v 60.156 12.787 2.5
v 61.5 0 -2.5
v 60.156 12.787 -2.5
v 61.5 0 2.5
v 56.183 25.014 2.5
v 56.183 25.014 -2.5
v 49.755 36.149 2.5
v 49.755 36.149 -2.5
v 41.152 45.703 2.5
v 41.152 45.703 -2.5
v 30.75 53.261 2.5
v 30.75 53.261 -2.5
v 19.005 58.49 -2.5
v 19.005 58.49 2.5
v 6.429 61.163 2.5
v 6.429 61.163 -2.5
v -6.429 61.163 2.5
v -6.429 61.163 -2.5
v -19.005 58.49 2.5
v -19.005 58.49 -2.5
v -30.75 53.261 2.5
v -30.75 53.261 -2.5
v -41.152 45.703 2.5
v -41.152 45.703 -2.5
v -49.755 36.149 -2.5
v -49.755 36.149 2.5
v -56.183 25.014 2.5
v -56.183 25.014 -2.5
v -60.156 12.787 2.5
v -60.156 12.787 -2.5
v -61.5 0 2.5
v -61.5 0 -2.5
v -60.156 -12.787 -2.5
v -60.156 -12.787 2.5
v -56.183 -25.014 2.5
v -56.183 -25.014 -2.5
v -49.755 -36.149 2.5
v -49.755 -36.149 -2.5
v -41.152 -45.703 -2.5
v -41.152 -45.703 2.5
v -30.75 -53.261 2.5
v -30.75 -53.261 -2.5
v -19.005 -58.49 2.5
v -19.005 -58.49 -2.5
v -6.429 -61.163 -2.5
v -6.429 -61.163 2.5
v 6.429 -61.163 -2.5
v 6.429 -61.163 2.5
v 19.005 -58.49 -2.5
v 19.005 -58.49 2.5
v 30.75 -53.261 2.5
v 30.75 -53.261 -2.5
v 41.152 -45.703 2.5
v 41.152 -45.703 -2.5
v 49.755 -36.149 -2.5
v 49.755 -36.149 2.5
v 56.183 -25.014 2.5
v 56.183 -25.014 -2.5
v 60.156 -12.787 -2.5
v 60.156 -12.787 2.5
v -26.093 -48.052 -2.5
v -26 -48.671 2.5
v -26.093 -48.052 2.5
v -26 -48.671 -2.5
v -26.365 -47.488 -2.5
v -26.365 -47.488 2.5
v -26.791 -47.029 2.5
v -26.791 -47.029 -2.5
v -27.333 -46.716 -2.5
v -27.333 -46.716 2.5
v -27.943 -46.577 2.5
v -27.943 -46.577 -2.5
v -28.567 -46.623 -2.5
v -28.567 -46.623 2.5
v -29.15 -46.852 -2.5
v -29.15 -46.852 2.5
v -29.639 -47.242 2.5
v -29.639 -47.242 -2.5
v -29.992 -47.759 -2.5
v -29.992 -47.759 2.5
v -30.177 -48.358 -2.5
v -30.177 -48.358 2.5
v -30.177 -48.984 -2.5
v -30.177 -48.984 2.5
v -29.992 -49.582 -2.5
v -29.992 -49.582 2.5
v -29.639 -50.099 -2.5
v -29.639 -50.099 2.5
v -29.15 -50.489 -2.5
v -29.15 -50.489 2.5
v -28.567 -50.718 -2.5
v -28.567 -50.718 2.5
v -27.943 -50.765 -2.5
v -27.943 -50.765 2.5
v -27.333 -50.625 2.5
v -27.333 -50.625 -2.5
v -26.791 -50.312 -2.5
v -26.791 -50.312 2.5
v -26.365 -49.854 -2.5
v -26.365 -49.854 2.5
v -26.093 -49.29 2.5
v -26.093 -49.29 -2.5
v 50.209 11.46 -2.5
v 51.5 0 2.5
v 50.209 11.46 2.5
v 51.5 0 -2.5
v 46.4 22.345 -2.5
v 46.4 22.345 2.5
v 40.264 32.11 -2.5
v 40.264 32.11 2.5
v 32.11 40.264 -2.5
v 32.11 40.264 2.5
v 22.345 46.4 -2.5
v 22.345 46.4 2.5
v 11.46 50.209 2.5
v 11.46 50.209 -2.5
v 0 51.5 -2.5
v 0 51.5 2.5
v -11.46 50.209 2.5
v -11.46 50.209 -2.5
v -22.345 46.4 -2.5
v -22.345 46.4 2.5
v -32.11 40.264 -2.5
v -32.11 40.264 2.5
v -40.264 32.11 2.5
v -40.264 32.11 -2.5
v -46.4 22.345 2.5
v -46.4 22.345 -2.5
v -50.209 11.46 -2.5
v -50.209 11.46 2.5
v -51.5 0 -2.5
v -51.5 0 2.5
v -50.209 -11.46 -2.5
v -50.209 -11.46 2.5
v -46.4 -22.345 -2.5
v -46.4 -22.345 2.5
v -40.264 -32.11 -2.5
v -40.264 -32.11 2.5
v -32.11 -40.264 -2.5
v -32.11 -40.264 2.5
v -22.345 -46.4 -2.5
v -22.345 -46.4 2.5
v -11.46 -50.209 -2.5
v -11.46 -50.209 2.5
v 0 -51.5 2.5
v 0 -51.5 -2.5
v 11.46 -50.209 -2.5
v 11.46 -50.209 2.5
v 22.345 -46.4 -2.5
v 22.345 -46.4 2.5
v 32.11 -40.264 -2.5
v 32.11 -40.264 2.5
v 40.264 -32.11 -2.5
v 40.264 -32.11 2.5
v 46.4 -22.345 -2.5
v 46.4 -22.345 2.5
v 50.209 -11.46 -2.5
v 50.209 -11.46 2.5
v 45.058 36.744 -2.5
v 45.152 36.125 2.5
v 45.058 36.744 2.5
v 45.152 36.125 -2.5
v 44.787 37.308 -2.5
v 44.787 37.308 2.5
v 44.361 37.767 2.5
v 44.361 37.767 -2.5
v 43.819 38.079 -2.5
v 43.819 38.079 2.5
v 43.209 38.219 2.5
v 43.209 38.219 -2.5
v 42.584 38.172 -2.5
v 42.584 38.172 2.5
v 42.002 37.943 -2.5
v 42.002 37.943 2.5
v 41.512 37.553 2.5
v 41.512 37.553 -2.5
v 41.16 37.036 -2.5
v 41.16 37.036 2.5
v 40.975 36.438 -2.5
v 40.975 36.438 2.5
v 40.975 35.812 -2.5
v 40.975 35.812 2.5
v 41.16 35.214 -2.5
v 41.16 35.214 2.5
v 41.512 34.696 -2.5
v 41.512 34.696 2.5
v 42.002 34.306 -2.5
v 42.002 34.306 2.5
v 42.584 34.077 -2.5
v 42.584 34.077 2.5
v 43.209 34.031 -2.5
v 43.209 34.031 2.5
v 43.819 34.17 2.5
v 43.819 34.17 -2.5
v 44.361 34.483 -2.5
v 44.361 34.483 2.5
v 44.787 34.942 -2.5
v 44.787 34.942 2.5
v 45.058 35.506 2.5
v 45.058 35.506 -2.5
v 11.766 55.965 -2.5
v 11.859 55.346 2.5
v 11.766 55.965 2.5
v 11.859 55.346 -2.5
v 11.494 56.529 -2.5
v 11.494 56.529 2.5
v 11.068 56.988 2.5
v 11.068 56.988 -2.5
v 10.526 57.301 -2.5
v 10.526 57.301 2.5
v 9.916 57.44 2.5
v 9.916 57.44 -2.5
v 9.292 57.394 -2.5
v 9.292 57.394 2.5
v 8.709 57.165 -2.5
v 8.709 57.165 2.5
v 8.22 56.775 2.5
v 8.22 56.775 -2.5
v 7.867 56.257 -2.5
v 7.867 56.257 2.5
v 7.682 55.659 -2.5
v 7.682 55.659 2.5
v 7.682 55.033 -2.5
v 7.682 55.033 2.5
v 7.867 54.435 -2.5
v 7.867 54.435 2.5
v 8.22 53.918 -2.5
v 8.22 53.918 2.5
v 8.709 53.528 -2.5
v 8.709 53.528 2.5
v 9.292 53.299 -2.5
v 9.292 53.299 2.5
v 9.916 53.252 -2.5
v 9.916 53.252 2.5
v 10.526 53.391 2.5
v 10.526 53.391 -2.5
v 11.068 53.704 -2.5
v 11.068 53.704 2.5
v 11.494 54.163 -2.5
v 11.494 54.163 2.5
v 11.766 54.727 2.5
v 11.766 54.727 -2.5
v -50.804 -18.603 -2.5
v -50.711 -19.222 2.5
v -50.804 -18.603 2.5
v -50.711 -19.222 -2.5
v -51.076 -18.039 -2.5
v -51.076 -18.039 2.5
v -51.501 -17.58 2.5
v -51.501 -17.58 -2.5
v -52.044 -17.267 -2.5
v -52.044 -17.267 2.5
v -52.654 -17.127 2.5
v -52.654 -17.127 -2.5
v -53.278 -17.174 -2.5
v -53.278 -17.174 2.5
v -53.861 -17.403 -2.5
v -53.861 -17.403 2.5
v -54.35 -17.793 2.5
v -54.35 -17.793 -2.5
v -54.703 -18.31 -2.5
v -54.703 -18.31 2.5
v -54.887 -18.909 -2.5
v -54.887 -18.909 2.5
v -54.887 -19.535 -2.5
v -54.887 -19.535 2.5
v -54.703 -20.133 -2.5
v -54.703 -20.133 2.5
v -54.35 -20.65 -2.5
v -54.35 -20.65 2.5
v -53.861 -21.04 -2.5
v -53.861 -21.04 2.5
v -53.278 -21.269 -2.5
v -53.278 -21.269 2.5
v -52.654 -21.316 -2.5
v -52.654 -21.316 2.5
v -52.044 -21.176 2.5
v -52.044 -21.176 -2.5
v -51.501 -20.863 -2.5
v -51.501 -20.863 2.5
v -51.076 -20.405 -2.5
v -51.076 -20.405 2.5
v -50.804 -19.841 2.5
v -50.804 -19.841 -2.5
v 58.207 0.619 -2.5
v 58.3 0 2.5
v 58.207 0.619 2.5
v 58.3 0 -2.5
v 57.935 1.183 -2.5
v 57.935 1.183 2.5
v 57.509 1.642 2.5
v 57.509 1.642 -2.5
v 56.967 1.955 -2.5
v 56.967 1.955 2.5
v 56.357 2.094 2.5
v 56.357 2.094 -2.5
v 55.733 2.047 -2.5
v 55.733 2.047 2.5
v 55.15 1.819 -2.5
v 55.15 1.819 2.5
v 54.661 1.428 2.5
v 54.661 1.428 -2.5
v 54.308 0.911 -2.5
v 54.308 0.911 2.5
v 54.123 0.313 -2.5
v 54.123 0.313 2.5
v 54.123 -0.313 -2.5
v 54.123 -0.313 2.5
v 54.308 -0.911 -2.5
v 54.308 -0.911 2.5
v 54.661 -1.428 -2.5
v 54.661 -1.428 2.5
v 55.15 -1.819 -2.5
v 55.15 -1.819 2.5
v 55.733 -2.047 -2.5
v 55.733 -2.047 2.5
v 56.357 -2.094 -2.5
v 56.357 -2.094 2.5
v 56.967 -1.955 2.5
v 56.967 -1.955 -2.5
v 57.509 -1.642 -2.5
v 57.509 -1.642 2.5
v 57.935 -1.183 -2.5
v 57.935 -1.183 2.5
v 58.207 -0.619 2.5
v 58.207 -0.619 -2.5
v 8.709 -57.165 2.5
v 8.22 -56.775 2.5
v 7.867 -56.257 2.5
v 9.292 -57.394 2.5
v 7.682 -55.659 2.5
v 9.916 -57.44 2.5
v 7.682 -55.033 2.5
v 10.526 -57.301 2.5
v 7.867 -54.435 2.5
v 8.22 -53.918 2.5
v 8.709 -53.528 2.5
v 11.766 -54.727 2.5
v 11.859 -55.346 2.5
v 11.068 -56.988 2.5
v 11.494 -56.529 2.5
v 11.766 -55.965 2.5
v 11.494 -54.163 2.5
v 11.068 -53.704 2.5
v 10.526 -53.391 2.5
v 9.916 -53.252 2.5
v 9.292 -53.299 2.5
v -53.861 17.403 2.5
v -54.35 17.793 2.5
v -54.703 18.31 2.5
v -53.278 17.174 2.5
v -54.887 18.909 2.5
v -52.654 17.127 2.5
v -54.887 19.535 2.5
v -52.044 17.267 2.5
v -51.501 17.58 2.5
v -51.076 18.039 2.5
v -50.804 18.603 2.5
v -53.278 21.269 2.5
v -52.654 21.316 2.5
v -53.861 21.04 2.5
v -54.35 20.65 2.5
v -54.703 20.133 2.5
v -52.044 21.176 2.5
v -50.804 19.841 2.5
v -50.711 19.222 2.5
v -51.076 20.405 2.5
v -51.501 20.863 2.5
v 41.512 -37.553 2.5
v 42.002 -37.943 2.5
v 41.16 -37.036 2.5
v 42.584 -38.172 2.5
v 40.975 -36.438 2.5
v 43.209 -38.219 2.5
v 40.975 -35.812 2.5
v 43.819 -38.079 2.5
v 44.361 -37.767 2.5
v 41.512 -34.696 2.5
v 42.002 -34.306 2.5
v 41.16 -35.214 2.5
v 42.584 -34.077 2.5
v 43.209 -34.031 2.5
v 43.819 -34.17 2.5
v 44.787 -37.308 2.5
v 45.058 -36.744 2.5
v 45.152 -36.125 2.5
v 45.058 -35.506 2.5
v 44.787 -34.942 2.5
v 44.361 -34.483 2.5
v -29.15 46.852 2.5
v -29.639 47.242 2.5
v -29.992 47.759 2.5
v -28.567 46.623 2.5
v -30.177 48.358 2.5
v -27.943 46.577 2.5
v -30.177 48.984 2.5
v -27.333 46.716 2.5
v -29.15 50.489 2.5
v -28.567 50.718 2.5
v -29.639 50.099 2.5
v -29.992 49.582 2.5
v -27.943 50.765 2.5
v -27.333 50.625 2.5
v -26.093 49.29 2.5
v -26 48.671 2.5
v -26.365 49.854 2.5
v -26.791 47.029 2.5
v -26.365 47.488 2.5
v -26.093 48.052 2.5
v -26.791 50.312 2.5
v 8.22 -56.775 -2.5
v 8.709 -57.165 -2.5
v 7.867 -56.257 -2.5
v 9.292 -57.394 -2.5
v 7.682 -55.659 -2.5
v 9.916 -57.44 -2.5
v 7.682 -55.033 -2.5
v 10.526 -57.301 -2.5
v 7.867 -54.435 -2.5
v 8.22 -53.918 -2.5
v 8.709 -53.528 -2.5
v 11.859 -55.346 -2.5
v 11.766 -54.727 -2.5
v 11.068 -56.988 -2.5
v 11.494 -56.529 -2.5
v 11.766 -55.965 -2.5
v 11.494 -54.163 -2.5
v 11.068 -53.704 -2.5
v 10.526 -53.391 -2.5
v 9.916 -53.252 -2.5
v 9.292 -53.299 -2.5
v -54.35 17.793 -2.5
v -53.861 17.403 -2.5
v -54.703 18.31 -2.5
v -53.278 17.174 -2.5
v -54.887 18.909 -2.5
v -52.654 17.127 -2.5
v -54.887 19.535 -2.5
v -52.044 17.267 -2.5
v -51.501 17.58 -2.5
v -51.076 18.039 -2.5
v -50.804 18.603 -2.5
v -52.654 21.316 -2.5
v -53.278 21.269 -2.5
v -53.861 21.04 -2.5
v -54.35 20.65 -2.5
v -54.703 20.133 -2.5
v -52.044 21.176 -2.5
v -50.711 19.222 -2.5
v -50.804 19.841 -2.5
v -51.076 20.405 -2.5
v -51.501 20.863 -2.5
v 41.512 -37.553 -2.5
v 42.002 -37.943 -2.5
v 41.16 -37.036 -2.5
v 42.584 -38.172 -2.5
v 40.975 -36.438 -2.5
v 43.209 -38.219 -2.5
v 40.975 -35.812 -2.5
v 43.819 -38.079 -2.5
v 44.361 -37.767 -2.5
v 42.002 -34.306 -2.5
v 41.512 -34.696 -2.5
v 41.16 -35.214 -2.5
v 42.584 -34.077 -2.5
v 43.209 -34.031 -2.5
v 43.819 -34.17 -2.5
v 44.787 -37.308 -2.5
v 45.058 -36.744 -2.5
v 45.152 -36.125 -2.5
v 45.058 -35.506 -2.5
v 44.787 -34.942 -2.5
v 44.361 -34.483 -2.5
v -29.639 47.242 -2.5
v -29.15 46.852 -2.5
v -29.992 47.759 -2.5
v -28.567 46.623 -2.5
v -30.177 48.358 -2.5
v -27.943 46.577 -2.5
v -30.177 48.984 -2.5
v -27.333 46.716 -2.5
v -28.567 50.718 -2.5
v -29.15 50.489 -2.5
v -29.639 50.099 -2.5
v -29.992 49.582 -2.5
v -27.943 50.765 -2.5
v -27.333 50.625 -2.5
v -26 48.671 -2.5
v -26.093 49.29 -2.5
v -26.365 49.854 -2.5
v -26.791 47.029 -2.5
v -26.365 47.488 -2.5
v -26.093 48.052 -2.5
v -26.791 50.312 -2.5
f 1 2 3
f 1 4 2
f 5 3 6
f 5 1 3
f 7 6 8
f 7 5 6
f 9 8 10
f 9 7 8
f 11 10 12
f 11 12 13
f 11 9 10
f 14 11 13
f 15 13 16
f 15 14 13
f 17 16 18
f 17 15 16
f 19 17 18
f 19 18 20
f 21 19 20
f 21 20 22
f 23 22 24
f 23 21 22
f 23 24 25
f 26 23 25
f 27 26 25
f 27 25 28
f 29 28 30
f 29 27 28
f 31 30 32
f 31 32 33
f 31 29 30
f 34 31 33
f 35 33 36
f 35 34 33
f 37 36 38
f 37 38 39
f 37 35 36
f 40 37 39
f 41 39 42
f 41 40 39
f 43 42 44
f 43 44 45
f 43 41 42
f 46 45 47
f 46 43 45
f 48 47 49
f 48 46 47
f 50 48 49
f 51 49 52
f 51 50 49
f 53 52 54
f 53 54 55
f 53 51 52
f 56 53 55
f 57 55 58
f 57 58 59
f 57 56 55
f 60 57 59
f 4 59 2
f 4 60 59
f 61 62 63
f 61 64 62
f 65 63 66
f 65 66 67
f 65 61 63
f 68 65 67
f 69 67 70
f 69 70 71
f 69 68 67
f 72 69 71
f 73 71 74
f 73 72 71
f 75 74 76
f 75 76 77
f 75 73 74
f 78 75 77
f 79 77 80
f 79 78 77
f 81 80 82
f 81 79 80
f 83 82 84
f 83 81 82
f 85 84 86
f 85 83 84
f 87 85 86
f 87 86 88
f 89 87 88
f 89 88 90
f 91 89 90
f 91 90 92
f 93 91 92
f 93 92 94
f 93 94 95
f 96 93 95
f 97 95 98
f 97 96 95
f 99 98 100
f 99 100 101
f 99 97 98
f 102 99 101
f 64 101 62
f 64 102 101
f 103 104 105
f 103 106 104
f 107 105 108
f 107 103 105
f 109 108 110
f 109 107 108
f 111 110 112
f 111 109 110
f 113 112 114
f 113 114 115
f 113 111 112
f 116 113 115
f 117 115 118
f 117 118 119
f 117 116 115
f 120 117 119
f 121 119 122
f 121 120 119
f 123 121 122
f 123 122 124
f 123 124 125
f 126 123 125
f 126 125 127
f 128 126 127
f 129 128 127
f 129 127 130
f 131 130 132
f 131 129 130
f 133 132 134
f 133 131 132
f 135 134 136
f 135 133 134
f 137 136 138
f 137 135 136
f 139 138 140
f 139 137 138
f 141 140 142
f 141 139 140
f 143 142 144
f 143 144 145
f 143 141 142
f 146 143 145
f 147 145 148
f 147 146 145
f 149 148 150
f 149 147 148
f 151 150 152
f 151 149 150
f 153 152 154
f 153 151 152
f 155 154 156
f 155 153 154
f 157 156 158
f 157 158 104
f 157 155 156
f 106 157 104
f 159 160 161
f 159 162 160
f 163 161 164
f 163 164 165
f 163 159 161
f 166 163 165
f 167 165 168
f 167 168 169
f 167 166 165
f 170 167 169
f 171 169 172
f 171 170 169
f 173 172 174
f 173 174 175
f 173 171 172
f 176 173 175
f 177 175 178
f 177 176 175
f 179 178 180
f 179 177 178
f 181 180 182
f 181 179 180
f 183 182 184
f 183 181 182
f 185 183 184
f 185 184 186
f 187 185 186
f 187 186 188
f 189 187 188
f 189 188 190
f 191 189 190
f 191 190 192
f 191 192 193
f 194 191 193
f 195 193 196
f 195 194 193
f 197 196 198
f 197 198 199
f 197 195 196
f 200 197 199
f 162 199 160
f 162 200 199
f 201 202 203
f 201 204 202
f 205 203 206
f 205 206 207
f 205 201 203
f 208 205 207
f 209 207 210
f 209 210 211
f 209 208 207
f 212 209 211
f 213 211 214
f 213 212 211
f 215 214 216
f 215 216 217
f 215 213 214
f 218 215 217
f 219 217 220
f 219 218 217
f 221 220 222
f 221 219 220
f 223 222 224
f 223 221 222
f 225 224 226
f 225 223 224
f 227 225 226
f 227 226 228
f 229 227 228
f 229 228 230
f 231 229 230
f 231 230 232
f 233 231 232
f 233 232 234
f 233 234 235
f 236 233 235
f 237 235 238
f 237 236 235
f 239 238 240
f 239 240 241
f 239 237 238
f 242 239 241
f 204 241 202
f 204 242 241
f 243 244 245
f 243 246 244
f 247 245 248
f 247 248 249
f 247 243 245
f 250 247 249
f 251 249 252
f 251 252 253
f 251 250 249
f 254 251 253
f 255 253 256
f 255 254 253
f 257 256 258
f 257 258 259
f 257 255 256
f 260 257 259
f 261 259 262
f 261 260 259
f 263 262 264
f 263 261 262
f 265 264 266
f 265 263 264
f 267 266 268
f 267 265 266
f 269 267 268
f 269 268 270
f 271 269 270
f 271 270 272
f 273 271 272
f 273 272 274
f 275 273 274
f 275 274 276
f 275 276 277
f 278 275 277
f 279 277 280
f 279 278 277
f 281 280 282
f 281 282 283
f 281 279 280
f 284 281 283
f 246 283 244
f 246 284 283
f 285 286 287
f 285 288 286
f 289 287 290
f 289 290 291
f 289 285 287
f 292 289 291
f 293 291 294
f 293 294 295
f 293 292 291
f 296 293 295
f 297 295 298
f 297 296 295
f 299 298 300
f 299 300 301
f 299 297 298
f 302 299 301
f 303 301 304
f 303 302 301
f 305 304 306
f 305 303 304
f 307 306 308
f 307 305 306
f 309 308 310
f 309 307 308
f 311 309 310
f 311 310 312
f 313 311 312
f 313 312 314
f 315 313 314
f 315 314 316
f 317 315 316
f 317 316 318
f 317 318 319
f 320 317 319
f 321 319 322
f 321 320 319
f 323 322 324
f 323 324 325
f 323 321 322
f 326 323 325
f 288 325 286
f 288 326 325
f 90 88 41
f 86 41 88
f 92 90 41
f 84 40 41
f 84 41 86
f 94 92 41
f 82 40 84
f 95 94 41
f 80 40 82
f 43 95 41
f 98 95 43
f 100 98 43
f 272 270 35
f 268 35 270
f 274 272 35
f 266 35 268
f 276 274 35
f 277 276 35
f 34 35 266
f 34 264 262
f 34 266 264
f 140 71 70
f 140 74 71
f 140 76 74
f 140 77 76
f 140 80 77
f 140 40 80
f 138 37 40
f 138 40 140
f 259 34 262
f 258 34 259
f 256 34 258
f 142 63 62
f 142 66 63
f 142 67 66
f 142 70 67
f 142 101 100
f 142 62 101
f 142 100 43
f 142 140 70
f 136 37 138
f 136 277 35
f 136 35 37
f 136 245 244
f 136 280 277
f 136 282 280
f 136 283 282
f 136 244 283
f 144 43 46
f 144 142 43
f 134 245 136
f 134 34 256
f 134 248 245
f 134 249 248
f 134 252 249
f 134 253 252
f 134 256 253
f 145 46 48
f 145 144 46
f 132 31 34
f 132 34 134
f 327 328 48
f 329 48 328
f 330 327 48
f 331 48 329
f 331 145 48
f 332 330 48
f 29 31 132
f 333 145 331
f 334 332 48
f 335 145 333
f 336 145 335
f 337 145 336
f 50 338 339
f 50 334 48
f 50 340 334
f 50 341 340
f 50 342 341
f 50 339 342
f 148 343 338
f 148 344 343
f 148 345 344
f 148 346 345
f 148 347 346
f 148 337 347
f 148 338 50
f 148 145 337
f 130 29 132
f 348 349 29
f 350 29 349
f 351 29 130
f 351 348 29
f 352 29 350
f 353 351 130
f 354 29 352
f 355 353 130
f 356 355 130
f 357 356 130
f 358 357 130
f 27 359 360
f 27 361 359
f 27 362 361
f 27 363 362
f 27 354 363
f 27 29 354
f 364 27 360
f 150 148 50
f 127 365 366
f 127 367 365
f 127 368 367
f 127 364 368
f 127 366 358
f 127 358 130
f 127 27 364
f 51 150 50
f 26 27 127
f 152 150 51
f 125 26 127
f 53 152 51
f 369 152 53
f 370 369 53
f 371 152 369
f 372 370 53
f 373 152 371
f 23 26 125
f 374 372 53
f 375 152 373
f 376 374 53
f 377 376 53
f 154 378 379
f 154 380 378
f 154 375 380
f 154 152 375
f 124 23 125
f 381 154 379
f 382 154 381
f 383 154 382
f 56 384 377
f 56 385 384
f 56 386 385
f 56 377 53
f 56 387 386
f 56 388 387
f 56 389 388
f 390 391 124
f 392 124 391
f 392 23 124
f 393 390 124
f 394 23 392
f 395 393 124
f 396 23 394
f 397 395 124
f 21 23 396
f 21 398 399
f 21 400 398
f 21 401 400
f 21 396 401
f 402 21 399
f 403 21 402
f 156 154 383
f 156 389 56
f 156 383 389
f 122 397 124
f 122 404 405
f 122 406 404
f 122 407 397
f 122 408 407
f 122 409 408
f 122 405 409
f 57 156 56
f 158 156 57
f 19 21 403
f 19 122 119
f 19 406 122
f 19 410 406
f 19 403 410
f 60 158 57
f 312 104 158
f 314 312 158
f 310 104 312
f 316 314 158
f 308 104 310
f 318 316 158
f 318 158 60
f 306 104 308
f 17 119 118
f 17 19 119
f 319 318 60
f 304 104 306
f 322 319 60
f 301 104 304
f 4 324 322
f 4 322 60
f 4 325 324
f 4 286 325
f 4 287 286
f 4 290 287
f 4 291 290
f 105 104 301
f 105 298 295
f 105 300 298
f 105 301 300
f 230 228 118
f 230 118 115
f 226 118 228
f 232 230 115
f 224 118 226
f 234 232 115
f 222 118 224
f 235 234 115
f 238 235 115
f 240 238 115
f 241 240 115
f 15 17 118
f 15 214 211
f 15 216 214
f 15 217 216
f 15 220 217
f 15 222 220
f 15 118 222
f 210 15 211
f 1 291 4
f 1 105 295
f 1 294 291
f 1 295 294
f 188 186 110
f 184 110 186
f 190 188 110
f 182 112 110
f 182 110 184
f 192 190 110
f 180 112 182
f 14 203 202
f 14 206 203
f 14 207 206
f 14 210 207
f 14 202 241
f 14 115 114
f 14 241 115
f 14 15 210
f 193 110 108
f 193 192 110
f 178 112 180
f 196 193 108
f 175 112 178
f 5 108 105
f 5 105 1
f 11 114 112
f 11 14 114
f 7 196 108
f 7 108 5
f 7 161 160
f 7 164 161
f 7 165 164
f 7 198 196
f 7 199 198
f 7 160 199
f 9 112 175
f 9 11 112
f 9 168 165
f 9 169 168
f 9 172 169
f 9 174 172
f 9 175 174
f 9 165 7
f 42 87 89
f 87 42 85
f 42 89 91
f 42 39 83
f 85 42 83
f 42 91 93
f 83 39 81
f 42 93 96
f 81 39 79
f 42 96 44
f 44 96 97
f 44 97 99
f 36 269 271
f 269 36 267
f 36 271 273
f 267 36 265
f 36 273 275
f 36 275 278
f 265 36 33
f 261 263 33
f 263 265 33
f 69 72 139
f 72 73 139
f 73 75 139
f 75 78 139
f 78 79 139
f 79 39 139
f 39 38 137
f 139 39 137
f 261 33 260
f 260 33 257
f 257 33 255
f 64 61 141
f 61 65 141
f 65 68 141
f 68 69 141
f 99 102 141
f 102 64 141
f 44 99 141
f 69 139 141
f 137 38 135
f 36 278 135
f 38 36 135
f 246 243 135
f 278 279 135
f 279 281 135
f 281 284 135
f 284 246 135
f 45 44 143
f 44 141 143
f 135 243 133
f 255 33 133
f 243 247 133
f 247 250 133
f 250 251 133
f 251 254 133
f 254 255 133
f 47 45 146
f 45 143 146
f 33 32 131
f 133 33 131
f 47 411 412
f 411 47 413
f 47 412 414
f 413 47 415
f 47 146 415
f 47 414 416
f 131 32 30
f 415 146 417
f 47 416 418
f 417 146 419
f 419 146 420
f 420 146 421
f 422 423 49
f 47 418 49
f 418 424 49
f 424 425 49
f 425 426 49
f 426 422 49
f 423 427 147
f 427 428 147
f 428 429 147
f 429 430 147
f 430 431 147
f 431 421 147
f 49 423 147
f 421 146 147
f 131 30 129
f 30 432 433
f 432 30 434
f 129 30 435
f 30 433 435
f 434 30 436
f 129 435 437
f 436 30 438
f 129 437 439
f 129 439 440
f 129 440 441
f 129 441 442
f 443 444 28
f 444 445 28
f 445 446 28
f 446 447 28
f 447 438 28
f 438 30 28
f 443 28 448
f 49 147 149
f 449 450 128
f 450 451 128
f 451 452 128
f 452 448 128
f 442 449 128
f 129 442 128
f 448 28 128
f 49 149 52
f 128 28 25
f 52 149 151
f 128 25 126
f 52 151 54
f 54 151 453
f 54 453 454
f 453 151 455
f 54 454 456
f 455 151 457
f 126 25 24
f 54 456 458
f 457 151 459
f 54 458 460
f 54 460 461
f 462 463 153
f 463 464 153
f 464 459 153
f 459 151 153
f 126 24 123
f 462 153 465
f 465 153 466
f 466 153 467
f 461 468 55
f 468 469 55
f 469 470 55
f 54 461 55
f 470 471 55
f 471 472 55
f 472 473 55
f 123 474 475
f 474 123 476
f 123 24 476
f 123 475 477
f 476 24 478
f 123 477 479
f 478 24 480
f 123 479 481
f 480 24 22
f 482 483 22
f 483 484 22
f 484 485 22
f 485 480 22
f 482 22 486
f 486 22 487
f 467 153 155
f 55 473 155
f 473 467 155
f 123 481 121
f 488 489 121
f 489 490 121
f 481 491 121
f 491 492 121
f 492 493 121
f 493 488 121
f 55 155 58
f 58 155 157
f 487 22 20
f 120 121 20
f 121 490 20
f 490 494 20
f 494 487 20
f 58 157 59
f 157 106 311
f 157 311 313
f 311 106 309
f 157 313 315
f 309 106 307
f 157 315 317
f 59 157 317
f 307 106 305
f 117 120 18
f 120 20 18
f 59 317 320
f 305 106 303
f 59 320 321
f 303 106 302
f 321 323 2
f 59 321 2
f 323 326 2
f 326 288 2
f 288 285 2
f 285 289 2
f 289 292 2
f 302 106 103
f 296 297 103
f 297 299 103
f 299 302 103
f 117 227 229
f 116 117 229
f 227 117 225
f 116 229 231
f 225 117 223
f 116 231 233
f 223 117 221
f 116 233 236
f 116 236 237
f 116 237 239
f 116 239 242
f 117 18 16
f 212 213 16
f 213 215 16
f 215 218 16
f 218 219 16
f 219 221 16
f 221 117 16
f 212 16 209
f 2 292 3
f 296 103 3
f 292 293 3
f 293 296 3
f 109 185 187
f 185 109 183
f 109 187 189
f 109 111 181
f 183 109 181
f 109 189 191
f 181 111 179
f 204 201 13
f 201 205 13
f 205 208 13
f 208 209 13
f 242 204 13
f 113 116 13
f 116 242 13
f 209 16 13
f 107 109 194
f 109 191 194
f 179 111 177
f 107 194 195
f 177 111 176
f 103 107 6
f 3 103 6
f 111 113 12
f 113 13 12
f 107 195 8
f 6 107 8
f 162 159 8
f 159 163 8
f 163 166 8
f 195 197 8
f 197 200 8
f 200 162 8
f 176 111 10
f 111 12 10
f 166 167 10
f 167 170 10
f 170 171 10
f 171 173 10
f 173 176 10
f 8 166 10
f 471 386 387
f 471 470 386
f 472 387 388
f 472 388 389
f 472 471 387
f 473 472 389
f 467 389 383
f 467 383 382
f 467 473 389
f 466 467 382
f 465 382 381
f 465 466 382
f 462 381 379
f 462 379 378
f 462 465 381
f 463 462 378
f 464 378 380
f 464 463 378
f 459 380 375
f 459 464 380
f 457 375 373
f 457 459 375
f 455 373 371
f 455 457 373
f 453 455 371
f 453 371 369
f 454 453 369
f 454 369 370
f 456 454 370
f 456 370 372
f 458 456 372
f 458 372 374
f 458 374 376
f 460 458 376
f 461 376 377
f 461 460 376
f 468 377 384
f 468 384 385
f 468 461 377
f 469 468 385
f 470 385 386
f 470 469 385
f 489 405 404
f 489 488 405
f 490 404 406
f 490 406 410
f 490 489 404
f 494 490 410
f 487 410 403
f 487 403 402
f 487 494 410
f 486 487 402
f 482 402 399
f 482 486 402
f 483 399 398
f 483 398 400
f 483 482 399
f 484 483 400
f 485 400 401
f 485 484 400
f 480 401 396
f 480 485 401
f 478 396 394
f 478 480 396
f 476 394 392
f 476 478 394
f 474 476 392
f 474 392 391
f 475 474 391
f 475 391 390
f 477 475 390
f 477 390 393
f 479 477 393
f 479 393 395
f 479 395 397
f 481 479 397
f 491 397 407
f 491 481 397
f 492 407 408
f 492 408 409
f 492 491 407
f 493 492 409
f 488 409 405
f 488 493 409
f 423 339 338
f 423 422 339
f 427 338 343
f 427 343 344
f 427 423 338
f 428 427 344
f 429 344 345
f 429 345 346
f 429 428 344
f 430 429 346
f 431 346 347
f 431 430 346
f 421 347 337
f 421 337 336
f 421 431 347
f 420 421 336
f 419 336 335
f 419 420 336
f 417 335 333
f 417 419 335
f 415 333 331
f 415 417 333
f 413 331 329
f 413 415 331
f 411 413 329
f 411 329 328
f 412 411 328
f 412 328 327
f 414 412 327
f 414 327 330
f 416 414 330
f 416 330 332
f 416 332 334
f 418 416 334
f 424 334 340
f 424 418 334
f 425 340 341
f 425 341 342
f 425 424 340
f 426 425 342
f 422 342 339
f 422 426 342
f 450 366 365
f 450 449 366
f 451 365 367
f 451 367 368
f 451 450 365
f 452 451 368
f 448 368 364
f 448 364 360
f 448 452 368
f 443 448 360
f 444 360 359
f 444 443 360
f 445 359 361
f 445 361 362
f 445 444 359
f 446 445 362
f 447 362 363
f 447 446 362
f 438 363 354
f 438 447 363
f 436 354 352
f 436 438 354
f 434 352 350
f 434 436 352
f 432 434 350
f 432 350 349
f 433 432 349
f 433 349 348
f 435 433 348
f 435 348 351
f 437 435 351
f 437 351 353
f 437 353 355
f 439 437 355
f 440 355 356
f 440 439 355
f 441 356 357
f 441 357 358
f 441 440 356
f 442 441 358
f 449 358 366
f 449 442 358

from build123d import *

# Parameters (mm, degrees)
F0_R     = 61.5
F0_R_2   = 2.1
F0_R_3   = 51.5
F1_DEPTH = 2.5


with BuildPart() as f1:
    # F0 (on Top) → F1 (new body, symmetric)
    with BuildSketch(Plane.XY):
        Circle(F0_R)
        with Locations((-28.1, -48.670628)):
            Circle(F0_R_2, mode=Mode.SUBTRACT)
        with Locations((-52.810725, -19.221532)):
            Circle(F0_R_2, mode=Mode.SUBTRACT)
        with Locations((9.759028, -55.346196)):
            Circle(F0_R_2, mode=Mode.SUBTRACT)
        with Locations((43.051698, -36.124664)):
            Circle(F0_R_2, mode=Mode.SUBTRACT)
        with Locations((-52.810725, 19.221532)):
            Circle(F0_R_2, mode=Mode.SUBTRACT)
        with Locations((-28.1, 48.670628)):
            Circle(F0_R_2, mode=Mode.SUBTRACT)
        Circle(F0_R_3, mode=Mode.SUBTRACT)
        with Locations((56.2, 0)):
            Circle(F0_R_2, mode=Mode.SUBTRACT)
        with Locations((9.759028, 55.346196)):
            Circle(F0_R_2, mode=Mode.SUBTRACT)
        with Locations((43.051698, 36.124664)):
            Circle(F0_R_2, mode=Mode.SUBTRACT)
    extrude(amount=F1_DEPTH, both=True)


solid = f1.part
